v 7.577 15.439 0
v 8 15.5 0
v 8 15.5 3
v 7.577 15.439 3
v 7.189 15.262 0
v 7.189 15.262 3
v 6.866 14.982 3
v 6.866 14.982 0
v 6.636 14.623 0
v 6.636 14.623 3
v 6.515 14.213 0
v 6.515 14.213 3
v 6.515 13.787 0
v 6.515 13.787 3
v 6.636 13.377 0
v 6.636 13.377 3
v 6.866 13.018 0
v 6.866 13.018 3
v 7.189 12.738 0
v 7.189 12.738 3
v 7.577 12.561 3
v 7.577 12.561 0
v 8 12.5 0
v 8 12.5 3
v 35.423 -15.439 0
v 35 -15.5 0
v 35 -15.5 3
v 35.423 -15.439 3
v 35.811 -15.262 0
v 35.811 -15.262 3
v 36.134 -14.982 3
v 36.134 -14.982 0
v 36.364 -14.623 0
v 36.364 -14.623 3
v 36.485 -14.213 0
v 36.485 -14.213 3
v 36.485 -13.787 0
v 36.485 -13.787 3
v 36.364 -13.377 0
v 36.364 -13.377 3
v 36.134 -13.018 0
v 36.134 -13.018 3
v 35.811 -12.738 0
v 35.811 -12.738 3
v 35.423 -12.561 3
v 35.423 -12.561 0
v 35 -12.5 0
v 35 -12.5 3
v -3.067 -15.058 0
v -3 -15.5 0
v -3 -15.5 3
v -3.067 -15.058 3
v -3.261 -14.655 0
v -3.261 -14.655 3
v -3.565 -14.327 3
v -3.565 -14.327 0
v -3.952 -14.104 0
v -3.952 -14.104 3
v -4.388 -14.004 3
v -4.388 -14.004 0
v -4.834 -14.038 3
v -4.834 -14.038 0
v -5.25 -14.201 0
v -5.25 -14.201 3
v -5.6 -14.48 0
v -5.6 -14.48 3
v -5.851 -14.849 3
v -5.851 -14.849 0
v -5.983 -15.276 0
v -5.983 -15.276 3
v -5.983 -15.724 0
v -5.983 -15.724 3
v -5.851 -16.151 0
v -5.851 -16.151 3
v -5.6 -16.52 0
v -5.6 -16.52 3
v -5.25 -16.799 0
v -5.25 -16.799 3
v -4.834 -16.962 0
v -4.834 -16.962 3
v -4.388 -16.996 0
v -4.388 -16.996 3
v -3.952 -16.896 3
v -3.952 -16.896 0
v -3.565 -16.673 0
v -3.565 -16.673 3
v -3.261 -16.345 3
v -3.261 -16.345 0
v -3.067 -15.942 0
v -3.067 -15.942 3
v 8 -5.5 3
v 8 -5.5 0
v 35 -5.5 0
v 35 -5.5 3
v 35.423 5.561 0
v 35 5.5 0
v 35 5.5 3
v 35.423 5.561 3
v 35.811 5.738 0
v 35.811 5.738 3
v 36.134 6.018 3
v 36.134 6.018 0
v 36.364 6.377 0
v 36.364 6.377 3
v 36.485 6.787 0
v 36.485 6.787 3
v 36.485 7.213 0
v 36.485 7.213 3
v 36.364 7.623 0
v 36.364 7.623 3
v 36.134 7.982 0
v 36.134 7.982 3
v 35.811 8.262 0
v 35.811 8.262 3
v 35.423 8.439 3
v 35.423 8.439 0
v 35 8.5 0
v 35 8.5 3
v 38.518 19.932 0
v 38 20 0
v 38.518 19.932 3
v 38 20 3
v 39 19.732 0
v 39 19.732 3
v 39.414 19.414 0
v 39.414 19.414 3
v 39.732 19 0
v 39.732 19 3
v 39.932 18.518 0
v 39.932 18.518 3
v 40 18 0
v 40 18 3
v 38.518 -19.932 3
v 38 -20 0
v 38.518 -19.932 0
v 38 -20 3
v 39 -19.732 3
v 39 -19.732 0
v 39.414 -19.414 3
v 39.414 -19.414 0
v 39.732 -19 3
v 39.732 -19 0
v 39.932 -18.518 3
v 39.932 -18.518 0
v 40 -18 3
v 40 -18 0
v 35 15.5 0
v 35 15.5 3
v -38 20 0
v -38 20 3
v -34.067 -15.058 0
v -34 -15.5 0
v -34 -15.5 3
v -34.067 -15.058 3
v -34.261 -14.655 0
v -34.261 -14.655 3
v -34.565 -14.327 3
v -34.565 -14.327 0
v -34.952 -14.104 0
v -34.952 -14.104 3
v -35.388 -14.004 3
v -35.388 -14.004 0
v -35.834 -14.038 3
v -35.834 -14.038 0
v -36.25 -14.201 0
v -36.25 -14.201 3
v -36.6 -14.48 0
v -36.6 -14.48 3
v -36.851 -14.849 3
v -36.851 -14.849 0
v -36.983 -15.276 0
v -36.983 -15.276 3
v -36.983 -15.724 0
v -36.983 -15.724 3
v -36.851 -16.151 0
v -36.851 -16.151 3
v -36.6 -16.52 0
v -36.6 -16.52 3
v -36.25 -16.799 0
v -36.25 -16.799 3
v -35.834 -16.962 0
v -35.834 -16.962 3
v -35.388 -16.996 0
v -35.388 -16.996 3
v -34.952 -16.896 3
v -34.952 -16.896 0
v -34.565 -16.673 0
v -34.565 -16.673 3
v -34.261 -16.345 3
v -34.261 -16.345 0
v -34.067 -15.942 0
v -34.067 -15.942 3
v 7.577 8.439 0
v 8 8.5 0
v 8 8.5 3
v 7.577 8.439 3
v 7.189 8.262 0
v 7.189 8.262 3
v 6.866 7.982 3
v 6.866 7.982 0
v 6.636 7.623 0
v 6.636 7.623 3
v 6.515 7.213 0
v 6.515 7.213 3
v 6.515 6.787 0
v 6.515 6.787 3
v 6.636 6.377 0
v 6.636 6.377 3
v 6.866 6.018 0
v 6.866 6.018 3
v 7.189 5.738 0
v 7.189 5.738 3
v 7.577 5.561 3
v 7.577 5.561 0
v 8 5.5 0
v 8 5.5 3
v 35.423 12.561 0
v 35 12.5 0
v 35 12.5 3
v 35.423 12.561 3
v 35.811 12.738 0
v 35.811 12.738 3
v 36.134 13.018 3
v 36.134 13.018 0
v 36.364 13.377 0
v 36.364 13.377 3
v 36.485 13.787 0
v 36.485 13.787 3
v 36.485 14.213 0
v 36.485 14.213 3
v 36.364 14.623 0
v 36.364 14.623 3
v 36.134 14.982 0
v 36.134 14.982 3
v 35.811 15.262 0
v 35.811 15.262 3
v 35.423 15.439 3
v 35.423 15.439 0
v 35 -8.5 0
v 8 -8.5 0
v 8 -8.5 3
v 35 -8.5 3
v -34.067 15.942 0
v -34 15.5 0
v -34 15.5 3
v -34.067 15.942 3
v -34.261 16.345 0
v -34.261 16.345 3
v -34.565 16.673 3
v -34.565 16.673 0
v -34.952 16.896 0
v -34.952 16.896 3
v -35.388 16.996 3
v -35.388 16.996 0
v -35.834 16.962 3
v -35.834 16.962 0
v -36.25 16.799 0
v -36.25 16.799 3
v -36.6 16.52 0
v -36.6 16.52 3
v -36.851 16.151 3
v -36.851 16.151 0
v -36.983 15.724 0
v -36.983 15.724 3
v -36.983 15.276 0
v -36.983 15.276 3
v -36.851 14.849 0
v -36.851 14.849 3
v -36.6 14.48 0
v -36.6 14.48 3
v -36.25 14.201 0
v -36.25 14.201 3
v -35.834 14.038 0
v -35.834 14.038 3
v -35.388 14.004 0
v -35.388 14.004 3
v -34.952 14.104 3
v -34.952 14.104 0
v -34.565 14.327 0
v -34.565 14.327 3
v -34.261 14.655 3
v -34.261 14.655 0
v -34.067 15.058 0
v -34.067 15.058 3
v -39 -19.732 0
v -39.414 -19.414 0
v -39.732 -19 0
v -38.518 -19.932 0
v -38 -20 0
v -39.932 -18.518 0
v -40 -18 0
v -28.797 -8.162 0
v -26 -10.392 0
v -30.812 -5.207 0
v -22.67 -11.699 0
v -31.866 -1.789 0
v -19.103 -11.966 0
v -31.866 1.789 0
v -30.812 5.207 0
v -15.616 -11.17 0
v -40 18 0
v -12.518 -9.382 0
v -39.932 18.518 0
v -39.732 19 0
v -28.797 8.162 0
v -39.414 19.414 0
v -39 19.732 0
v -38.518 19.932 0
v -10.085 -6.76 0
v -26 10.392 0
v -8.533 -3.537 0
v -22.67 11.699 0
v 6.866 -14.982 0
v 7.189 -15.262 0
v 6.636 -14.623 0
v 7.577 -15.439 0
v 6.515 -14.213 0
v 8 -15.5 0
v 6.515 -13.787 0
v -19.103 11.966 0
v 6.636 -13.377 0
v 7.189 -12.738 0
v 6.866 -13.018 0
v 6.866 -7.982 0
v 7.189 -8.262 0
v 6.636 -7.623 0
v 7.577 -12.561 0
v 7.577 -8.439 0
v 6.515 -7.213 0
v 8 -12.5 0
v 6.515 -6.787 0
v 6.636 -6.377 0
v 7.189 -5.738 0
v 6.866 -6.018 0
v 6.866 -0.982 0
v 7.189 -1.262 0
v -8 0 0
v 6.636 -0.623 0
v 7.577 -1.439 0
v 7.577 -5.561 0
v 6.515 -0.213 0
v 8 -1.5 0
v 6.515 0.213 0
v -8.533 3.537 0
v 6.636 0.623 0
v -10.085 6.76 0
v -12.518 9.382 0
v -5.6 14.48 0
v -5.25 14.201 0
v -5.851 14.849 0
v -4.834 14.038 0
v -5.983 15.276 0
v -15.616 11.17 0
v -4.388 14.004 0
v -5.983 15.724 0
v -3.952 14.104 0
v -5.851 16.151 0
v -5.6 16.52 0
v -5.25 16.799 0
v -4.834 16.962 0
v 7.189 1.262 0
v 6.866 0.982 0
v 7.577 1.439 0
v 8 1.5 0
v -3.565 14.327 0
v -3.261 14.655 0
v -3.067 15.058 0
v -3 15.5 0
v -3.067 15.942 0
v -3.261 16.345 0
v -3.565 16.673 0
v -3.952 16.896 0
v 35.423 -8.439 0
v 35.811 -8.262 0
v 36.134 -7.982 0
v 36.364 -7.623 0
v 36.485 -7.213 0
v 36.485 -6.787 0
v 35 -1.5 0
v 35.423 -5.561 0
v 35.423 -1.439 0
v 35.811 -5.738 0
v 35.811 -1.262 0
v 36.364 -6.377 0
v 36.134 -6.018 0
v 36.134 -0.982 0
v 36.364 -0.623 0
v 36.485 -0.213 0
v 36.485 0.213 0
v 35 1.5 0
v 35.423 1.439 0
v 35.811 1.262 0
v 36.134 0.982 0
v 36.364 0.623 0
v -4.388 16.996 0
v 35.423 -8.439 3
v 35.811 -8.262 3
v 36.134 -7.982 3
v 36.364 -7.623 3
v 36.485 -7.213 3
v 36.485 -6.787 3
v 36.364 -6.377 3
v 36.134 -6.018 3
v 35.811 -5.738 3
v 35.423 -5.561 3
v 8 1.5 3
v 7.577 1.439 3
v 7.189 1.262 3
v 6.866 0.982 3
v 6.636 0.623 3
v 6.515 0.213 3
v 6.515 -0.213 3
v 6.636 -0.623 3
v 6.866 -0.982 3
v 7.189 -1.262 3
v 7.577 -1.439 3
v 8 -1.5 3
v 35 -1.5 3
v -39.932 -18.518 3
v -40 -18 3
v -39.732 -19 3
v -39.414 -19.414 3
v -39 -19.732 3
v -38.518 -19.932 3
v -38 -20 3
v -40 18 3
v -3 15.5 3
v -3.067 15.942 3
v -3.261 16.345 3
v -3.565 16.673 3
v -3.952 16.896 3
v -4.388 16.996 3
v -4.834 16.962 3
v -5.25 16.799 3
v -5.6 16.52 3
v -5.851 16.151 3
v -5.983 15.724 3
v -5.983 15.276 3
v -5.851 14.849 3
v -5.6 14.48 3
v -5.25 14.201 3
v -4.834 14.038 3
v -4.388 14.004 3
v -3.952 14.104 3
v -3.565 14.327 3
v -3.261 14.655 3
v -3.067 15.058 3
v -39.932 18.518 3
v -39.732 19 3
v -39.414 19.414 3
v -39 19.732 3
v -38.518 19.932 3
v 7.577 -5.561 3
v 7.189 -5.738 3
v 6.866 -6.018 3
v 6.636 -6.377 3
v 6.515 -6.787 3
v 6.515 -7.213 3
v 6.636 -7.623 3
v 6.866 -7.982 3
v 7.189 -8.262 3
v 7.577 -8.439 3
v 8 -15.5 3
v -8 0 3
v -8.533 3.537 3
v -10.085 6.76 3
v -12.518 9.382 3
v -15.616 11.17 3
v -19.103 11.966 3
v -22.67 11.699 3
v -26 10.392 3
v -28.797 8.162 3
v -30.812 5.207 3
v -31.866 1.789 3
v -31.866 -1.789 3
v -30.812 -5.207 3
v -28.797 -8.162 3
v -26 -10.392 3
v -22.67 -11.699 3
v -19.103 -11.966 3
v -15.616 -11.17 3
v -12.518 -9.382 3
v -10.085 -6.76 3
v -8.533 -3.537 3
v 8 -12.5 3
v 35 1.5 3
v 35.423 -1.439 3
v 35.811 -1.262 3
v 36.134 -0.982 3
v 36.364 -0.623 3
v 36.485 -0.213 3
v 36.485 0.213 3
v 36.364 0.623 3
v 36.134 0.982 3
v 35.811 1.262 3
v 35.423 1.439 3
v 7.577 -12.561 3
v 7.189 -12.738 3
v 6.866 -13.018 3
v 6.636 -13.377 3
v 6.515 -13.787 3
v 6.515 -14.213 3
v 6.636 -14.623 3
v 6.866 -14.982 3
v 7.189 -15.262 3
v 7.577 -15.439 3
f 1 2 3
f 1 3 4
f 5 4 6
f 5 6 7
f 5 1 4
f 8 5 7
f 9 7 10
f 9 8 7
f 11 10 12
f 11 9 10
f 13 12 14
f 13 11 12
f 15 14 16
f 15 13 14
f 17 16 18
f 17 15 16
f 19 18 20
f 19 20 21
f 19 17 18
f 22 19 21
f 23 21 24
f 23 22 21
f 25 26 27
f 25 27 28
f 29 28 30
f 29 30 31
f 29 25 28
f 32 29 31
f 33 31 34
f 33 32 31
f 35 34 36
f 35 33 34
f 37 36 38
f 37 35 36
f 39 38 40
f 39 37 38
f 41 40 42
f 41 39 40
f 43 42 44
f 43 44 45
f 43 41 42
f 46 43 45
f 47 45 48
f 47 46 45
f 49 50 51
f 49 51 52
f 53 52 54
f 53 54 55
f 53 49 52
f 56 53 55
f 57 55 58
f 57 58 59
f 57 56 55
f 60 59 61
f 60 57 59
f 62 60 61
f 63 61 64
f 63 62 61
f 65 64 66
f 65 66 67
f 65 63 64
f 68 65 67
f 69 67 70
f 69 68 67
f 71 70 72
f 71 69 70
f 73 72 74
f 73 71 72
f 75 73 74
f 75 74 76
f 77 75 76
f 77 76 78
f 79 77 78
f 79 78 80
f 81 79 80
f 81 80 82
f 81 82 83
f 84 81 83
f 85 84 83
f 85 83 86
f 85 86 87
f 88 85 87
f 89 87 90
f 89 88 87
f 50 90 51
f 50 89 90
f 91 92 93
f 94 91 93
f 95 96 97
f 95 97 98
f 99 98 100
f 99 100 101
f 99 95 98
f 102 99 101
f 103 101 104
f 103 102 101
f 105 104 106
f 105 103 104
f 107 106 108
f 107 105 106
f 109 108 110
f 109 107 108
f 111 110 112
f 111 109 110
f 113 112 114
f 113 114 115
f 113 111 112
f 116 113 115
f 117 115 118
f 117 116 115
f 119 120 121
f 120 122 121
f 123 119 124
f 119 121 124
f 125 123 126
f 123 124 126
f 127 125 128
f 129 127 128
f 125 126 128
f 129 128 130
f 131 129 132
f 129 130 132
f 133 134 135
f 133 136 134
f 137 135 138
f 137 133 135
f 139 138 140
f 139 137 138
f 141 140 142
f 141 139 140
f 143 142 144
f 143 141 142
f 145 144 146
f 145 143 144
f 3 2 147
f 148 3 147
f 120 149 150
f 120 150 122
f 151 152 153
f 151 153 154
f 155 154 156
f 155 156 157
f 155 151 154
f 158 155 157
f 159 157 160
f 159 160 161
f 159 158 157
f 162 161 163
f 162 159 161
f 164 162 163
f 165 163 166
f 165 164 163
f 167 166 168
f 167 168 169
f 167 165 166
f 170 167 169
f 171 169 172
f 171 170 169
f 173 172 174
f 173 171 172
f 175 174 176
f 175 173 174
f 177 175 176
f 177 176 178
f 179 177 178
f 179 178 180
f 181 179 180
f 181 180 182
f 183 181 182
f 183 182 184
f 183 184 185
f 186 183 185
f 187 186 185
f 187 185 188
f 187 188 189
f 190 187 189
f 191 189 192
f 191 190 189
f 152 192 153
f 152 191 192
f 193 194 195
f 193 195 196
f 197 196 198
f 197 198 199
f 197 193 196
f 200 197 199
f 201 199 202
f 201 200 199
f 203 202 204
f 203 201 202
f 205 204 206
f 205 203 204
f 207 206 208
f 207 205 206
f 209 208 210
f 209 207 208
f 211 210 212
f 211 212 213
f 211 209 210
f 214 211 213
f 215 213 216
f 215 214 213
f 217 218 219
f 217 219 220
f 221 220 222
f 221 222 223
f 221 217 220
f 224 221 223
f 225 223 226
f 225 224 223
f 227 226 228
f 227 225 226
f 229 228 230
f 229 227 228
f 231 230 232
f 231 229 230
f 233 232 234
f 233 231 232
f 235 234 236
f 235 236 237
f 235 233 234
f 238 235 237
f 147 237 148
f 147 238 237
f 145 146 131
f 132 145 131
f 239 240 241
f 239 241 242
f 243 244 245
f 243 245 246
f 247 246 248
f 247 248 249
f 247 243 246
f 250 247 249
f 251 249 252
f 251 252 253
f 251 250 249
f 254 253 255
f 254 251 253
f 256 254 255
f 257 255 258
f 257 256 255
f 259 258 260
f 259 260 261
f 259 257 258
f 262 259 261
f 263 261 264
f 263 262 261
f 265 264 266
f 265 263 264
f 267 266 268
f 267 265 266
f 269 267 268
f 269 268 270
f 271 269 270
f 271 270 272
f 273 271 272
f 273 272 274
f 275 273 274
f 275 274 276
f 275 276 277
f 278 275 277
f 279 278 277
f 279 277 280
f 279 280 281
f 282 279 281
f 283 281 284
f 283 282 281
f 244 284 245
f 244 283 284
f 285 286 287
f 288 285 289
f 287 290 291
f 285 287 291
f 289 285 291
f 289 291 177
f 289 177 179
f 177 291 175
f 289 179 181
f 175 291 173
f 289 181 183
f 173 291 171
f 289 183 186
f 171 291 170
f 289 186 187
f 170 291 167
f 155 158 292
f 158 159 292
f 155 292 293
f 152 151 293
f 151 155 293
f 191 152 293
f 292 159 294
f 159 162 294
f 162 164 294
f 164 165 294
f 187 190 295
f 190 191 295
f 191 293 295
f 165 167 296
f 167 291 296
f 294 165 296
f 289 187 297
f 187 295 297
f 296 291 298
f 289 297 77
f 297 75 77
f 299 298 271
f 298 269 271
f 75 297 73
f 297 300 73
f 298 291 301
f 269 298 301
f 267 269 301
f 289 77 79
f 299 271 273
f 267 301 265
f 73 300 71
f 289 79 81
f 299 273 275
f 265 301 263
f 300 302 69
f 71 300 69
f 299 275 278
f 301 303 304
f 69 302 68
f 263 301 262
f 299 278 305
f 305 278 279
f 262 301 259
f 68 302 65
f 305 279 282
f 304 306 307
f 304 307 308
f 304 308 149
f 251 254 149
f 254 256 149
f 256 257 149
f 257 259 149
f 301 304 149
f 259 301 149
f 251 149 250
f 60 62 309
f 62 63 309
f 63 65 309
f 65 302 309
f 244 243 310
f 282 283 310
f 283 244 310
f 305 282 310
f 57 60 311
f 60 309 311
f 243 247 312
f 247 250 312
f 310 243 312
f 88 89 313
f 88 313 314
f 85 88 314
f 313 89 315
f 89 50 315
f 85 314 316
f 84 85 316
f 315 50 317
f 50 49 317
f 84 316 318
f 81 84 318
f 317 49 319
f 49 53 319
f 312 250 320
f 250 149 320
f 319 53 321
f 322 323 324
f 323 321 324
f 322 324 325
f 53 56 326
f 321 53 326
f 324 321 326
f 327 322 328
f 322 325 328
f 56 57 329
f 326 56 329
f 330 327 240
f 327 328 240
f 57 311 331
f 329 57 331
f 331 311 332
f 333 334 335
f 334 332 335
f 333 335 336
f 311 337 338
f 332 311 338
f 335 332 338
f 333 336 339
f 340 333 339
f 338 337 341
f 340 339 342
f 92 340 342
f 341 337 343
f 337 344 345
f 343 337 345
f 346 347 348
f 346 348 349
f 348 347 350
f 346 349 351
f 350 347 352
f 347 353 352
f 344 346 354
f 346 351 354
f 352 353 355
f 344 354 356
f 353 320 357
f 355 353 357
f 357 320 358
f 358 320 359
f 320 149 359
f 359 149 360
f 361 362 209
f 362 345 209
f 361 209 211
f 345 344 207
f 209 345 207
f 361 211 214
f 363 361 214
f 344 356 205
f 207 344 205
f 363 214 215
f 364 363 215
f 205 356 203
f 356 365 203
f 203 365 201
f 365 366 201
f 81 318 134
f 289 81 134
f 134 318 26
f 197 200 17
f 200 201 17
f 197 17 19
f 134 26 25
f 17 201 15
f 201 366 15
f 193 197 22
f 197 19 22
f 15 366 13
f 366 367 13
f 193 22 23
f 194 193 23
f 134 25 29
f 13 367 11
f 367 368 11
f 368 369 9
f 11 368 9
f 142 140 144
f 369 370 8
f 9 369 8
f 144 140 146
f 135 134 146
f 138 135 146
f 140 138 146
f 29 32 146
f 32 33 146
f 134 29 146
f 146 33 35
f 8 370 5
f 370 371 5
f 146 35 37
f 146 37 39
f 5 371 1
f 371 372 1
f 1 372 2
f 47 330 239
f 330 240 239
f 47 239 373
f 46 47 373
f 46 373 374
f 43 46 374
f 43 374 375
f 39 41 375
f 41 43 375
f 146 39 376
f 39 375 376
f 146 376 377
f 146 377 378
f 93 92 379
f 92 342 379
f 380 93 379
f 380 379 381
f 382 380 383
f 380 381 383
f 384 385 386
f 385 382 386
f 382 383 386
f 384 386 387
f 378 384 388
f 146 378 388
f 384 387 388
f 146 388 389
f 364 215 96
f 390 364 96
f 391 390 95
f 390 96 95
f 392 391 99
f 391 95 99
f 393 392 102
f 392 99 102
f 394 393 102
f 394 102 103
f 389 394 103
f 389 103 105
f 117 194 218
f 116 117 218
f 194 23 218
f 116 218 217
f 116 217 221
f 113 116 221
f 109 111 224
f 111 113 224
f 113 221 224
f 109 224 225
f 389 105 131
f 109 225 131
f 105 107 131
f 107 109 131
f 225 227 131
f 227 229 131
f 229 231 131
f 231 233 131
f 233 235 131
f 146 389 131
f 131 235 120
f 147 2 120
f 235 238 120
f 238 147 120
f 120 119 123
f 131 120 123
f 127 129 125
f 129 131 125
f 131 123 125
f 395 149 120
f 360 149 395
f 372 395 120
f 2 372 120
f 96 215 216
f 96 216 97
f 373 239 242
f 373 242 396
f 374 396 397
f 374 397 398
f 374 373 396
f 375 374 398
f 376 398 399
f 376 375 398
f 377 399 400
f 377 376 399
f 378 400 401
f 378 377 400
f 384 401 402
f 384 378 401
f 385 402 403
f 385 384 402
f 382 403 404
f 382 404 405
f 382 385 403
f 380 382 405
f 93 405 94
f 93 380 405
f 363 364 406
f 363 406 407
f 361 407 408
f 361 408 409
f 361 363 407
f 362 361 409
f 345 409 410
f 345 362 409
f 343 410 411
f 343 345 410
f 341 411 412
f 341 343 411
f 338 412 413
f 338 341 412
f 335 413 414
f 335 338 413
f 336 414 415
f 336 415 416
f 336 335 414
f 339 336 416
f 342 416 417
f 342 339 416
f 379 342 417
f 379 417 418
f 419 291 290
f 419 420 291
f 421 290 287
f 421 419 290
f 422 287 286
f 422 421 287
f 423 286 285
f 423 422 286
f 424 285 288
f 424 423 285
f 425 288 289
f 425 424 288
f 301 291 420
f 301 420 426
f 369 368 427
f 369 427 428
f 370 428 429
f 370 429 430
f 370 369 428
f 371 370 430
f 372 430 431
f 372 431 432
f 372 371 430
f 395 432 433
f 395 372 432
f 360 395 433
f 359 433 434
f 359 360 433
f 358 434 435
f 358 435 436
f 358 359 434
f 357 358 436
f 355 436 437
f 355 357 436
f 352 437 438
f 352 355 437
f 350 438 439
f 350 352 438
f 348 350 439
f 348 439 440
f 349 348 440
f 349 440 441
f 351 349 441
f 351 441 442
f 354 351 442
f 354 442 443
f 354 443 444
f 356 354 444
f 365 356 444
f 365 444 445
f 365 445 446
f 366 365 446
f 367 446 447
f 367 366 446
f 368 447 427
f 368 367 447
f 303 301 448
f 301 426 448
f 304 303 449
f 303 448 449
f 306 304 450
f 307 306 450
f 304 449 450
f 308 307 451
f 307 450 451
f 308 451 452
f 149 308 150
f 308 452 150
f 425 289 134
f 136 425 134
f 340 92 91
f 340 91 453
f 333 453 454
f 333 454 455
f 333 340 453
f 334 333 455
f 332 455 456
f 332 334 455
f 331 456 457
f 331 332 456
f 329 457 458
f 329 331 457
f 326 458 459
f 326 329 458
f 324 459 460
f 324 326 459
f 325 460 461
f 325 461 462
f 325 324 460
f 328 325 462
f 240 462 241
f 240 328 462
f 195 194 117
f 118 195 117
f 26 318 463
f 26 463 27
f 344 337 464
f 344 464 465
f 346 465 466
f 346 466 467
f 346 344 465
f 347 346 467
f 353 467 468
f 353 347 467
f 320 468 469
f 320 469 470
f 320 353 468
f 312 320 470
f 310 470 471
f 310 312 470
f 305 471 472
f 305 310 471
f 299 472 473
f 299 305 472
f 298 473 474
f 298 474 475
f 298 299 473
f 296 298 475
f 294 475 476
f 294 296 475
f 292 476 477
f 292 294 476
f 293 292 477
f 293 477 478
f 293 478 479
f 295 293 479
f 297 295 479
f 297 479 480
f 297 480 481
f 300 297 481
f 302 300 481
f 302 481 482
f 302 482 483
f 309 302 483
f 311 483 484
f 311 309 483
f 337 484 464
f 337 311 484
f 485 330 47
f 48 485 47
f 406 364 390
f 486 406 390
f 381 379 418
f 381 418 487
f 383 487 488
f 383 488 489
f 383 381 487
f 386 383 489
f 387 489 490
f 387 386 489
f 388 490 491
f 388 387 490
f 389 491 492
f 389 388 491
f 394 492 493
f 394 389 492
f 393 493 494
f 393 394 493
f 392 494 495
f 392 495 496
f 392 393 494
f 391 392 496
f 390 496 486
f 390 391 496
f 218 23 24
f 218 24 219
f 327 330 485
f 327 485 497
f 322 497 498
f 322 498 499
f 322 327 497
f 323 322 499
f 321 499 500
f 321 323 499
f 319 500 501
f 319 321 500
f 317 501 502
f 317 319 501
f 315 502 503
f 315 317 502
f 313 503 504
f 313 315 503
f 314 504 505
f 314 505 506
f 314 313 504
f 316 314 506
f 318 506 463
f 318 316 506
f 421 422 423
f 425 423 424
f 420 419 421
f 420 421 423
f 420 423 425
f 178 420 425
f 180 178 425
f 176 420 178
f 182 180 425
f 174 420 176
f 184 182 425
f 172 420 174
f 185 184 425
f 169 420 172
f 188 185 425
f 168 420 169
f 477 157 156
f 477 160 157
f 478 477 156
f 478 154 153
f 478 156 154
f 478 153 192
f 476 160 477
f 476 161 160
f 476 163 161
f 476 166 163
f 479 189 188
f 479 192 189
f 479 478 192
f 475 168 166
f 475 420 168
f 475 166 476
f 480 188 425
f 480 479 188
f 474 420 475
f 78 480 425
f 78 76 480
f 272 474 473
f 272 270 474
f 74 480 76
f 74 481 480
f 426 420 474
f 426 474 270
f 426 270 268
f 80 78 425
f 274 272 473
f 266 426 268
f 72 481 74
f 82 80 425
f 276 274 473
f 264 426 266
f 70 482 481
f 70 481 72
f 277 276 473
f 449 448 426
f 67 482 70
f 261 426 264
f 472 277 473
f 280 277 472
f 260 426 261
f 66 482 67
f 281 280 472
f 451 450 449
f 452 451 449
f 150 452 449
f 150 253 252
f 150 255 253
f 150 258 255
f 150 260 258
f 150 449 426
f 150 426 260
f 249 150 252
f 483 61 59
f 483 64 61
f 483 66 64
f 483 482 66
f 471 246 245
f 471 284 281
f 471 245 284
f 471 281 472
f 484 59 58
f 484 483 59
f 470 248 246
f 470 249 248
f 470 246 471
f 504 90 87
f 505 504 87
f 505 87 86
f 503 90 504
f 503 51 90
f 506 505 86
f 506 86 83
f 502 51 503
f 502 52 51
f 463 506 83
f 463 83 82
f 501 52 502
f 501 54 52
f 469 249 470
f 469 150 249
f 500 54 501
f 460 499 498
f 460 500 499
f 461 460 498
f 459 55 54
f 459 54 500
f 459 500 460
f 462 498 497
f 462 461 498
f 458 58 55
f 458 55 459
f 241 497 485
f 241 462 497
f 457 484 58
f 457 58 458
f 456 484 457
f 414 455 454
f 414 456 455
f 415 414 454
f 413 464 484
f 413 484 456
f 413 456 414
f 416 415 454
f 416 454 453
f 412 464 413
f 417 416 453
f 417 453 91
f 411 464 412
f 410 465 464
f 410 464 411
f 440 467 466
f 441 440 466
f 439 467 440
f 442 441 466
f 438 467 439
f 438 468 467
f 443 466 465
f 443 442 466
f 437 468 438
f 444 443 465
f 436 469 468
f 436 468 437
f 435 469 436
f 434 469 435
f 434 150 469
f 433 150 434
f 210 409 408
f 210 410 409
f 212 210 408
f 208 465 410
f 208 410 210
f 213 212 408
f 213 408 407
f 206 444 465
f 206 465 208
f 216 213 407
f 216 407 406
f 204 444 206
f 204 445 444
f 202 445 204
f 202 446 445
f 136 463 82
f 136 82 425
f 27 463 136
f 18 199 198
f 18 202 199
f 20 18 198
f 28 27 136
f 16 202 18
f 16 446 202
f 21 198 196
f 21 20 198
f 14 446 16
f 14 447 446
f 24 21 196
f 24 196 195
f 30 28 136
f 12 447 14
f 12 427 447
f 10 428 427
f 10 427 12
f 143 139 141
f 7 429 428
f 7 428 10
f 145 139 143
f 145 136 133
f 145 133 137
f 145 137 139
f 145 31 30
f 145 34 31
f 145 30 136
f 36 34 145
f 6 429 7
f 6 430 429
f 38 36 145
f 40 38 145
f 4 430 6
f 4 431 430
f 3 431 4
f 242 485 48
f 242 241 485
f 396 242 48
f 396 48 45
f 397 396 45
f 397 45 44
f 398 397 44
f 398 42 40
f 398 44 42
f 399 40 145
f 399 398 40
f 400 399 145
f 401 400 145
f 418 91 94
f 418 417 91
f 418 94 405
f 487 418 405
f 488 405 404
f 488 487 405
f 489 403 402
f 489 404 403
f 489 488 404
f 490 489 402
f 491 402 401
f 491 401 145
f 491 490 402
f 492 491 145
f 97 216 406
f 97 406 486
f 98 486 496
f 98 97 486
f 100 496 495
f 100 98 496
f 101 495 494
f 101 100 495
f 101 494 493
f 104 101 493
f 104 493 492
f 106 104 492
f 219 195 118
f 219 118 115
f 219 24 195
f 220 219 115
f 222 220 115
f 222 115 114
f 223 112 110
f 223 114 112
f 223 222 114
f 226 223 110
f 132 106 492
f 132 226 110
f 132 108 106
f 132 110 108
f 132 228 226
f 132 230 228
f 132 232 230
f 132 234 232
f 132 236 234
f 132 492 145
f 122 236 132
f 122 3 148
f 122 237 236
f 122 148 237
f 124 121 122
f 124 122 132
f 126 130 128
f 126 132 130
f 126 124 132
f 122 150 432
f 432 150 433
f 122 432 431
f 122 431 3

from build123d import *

# Parameters (mm, degrees)
SKETCH_W   = 80
SKETCH_H   = 40
SKETCH_R   = 12
SKETCH_R_2 = 1.5
PAD_DEPTH  = 3
FILLET_R   = 2


with BuildPart() as part:
    # Sketch → Pad (new body)
    with BuildSketch(Plane.XY):
        Rectangle(SKETCH_W, SKETCH_H)
        with Locations((-20, 0)):
            Circle(SKETCH_R, mode=Mode.SUBTRACT)
        with Locations((-35.5, 15.5)):
            Circle(SKETCH_R_2, mode=Mode.SUBTRACT)
        with Locations((-4.5, 15.5)):
            Circle(SKETCH_R_2, mode=Mode.SUBTRACT)
        with Locations((-35.5, -15.5)):
            Circle(SKETCH_R_2, mode=Mode.SUBTRACT)
        with Locations((-4.5, -15.5)):
            Circle(SKETCH_R_2, mode=Mode.SUBTRACT)
        with BuildLine():
            ThreePointArc((8, 1.5), (6.5, 0), (8, -1.5))
            Line((8, -1.5), (35, -1.5))
            ThreePointArc((35, -1.5), (36.5, 0), (35, 1.5))
            Line((8, 1.5), (35, 1.5))
        make_face(mode=Mode.SUBTRACT)
        with BuildLine():
            ThreePointArc((8, 8.5), (6.5, 7), (8, 5.5))
            Line((8, 5.5), (35, 5.5))
            ThreePointArc((35, 5.5), (36.5, 7), (35, 8.5))
            Line((8, 8.5), (35, 8.5))
        make_face(mode=Mode.SUBTRACT)
        with BuildLine():
            ThreePointArc((8, 15.5), (6.5, 14), (8, 12.5))
            Line((8, 12.5), (35, 12.5))
            ThreePointArc((35, 12.5), (36.5, 14), (35, 15.5))
            Line((8, 15.5), (35, 15.5))
        make_face(mode=Mode.SUBTRACT)
        with BuildLine():
            ThreePointArc((8, -5.5), (6.5, -7), (8, -8.5))
            Line((8, -8.5), (35, -8.5))
            ThreePointArc((35, -8.5), (36.5, -7), (35, -5.5))
            Line((8, -5.5), (35, -5.5))
        make_face(mode=Mode.SUBTRACT)
        with BuildLine():
            ThreePointArc((8, -12.5), (6.5, -14), (8, -15.5))
            Line((8, -15.5), (35, -15.5))
            ThreePointArc((35, -15.5), (36.5, -14), (35, -12.5))
            Line((8, -12.5), (35, -12.5))
        make_face(mode=Mode.SUBTRACT)
    extrude(amount=PAD_DEPTH)

    # Fillet
    fillet_edges = [part.edges().sort_by_distance(p)[0] for p in [
        (-40, 20, 1.5),
        (-40, -20, 1.5),
        (40, -20, 1.5),
        (40, 20, 1.5),
    ]]
    fillet(fillet_edges, radius=FILLET_R)


solid = part.part
